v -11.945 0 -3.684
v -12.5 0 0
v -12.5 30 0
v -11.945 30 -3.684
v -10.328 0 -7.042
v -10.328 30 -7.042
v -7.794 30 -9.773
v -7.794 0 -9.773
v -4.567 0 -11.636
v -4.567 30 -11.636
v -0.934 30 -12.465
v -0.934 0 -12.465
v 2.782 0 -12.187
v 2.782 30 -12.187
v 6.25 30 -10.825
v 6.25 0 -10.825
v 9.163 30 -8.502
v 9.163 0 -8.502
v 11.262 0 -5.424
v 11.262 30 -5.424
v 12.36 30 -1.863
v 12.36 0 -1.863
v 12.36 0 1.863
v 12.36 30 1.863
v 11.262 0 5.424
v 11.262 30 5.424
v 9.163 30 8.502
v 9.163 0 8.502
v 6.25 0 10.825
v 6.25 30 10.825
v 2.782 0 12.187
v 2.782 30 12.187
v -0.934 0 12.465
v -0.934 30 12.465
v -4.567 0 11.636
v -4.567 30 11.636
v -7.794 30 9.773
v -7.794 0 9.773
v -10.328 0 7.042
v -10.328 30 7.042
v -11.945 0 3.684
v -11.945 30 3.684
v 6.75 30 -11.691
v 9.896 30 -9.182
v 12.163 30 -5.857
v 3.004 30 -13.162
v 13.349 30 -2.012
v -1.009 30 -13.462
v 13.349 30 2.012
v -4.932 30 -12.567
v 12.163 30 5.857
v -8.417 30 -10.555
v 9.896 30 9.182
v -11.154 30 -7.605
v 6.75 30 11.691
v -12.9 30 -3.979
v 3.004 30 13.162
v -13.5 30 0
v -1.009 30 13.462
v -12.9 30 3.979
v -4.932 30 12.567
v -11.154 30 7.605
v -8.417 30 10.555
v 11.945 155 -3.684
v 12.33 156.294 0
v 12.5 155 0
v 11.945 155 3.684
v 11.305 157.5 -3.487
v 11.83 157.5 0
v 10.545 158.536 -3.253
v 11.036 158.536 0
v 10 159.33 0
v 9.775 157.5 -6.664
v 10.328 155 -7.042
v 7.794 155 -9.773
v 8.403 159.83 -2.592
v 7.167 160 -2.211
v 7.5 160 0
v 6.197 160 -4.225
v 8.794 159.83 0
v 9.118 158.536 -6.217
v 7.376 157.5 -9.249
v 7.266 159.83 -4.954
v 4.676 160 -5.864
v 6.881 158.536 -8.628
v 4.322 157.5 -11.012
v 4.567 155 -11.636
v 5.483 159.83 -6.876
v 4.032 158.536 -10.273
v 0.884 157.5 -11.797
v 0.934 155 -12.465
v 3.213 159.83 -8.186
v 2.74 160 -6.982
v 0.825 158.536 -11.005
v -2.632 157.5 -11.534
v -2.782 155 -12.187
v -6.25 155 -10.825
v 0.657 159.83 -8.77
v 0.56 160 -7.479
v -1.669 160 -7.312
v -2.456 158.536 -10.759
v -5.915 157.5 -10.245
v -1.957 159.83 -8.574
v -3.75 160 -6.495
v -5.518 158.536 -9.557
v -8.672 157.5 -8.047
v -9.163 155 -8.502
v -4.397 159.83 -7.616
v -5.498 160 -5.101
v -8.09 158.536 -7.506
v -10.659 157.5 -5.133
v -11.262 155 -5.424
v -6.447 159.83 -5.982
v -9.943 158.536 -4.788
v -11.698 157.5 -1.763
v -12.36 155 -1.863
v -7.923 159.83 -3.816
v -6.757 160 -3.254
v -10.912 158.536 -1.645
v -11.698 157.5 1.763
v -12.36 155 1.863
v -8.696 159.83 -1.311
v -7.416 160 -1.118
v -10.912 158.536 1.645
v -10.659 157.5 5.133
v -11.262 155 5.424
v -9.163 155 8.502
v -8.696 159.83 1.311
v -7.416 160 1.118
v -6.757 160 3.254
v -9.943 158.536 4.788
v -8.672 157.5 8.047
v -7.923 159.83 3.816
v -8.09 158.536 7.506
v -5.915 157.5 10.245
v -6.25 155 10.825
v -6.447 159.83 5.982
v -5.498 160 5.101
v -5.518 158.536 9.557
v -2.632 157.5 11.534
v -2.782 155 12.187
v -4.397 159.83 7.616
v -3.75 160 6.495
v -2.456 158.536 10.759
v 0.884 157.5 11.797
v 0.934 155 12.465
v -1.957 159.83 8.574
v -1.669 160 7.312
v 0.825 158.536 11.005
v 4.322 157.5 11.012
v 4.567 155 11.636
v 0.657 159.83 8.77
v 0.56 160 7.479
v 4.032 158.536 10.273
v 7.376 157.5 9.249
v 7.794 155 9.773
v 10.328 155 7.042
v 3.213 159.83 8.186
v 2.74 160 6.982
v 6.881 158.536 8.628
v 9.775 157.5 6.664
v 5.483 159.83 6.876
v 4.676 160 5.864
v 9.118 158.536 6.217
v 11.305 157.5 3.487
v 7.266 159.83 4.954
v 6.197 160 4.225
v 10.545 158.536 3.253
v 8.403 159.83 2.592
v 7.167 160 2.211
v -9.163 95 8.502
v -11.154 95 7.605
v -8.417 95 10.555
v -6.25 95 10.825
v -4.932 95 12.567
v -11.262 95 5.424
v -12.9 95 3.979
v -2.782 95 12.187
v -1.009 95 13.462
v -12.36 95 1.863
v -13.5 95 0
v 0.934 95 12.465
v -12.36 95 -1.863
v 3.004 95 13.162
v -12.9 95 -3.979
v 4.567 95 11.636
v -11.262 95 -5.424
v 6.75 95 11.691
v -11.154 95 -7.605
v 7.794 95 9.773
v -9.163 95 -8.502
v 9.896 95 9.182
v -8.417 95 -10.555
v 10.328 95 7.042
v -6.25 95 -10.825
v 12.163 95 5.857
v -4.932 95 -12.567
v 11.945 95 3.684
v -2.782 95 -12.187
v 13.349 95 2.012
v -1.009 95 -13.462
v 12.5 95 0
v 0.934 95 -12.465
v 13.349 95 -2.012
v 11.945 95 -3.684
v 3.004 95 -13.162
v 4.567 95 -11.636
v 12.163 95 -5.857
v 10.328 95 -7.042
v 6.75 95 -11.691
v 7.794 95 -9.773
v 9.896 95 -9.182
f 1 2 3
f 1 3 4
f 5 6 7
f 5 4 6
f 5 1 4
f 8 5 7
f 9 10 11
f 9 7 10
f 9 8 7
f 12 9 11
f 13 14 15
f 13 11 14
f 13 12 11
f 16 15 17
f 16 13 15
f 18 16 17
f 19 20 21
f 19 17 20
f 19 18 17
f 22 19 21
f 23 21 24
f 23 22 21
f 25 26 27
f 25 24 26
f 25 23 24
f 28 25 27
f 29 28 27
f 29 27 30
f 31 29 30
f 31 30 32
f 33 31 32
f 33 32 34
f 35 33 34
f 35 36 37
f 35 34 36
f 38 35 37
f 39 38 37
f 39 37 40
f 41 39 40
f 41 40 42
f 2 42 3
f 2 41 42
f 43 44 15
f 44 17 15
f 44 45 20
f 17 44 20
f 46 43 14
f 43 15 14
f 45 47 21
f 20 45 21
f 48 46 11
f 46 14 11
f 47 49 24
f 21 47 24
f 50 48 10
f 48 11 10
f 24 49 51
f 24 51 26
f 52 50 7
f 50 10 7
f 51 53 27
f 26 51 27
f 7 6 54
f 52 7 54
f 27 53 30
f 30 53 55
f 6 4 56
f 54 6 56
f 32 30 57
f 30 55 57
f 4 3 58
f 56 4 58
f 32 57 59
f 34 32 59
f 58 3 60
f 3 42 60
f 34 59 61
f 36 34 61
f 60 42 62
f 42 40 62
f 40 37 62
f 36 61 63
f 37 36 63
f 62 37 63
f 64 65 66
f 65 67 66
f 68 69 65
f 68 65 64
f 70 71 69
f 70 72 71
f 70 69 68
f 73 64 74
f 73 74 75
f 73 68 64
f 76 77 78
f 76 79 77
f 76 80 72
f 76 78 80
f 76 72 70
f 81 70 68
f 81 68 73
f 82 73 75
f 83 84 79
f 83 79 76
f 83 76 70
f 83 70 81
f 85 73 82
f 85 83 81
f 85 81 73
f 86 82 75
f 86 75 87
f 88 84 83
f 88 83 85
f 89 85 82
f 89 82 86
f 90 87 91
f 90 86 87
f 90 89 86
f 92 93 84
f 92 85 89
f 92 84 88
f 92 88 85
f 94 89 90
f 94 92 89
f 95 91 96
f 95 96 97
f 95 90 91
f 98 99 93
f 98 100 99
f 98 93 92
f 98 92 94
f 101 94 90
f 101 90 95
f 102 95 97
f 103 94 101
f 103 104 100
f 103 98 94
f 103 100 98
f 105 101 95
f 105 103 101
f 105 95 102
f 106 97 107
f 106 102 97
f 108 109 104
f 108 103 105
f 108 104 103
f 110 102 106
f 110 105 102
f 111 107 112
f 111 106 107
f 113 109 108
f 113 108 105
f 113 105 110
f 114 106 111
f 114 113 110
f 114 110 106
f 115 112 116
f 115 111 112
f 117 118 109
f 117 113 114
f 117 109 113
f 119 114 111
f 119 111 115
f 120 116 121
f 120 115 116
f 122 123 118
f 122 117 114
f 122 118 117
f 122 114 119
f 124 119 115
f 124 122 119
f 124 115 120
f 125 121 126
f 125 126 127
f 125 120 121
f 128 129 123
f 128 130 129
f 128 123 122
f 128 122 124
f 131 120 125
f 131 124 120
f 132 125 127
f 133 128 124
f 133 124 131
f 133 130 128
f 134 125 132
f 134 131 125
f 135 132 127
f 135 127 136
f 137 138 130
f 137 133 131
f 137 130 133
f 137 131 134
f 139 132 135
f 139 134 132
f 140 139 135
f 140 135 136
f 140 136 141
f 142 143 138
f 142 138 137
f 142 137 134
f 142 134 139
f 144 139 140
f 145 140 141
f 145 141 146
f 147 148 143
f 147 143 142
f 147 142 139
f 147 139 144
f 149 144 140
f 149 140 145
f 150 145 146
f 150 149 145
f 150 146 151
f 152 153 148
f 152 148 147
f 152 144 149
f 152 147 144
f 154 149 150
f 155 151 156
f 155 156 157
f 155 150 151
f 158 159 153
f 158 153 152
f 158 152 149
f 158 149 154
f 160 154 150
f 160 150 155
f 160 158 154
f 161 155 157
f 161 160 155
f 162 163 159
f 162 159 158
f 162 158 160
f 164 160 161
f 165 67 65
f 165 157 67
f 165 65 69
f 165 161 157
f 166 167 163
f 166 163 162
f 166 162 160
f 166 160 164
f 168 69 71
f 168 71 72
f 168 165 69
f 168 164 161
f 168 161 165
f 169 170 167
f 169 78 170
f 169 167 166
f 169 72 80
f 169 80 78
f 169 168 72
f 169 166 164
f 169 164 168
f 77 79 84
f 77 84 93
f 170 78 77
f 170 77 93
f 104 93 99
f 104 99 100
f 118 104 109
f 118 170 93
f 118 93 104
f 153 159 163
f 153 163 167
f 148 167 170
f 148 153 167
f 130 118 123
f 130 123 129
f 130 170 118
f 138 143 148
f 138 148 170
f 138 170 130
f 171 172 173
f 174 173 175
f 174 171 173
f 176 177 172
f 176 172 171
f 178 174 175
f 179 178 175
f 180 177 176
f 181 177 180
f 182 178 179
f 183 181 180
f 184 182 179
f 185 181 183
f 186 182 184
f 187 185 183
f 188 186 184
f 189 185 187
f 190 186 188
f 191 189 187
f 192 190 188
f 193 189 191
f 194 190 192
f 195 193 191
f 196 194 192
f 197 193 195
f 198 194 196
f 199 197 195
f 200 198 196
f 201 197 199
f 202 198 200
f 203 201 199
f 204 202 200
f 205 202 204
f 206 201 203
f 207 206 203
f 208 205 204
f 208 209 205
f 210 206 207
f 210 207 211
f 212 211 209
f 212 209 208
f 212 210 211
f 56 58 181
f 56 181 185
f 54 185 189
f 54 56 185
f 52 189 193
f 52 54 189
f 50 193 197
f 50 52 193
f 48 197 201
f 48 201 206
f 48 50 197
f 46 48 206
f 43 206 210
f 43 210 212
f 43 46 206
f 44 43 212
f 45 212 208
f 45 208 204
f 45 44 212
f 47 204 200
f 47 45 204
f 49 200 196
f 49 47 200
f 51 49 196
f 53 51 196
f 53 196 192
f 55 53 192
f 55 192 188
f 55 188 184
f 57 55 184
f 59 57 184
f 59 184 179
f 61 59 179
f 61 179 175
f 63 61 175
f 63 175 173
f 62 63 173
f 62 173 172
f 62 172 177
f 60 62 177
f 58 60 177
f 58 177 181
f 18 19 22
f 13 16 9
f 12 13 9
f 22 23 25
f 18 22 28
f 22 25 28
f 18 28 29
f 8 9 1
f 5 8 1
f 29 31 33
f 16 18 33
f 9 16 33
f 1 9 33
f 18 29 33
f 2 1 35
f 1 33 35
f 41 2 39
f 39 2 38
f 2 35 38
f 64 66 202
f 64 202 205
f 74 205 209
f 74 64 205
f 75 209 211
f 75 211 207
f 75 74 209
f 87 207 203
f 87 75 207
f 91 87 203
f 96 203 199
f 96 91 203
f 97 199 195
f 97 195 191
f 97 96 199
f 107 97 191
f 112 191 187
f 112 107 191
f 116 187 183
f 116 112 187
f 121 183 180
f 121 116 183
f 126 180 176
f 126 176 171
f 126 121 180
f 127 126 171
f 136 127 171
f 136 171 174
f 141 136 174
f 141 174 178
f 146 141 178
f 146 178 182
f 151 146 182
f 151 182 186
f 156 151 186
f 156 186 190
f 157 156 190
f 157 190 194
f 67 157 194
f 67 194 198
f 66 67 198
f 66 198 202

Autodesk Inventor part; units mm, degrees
ref_plane "YZ Plane" through (0, 0, 0) normal (1, 0, 0) x (0, 1, 0)
ref_plane "XZ Plane" through (0, 0, 0) normal (0, 1, 0) x (-1, 0, 0)
ref_plane "XY Plane" through (0, 0, 0) normal (0, 0, 1) x (1, 0, 0)
sketch "Sketch1" plane through (0, 0, 0) normal (0, 1, 0) x (-1, 0, 0)
  circle A0 centre (0, 0) radius 13.5
  circle A1 centre (0, 0) radius 12.5
  dimension "d0" = 27
  dimension "d6" = 25
extrude "Extrusion1" add sketch "Sketch1" along normal blind 160 contours A0 | A1
sketch "Sketch2" plane through (0, 160, 0) normal (0, 1, 0) x (1, 0, 0)
  circle A0 centre (0, 0) radius 13.5 projected
  circle A1 centre (0, 0) radius 12.5
  dimension "d3" = 25
extrude "Extrusion2" cut sketch "Sketch2" against normal blind 65
extrude "Extrusion3" cut sketch "Sketch1" along normal blind 30
fillet "Fillet1" radius 5 1 edges at (-12.5, 160, 0)
thread "Thread1" size "M25x1.5" class "6g" standard "ANSI Metric M Profile" length 60
thread "Thread2" size "M25x1.5" class "6g" standard "ANSI Metric M Profile" length 30
properties part number "Stud" material "Steel, High Strength, Low Alloy"
